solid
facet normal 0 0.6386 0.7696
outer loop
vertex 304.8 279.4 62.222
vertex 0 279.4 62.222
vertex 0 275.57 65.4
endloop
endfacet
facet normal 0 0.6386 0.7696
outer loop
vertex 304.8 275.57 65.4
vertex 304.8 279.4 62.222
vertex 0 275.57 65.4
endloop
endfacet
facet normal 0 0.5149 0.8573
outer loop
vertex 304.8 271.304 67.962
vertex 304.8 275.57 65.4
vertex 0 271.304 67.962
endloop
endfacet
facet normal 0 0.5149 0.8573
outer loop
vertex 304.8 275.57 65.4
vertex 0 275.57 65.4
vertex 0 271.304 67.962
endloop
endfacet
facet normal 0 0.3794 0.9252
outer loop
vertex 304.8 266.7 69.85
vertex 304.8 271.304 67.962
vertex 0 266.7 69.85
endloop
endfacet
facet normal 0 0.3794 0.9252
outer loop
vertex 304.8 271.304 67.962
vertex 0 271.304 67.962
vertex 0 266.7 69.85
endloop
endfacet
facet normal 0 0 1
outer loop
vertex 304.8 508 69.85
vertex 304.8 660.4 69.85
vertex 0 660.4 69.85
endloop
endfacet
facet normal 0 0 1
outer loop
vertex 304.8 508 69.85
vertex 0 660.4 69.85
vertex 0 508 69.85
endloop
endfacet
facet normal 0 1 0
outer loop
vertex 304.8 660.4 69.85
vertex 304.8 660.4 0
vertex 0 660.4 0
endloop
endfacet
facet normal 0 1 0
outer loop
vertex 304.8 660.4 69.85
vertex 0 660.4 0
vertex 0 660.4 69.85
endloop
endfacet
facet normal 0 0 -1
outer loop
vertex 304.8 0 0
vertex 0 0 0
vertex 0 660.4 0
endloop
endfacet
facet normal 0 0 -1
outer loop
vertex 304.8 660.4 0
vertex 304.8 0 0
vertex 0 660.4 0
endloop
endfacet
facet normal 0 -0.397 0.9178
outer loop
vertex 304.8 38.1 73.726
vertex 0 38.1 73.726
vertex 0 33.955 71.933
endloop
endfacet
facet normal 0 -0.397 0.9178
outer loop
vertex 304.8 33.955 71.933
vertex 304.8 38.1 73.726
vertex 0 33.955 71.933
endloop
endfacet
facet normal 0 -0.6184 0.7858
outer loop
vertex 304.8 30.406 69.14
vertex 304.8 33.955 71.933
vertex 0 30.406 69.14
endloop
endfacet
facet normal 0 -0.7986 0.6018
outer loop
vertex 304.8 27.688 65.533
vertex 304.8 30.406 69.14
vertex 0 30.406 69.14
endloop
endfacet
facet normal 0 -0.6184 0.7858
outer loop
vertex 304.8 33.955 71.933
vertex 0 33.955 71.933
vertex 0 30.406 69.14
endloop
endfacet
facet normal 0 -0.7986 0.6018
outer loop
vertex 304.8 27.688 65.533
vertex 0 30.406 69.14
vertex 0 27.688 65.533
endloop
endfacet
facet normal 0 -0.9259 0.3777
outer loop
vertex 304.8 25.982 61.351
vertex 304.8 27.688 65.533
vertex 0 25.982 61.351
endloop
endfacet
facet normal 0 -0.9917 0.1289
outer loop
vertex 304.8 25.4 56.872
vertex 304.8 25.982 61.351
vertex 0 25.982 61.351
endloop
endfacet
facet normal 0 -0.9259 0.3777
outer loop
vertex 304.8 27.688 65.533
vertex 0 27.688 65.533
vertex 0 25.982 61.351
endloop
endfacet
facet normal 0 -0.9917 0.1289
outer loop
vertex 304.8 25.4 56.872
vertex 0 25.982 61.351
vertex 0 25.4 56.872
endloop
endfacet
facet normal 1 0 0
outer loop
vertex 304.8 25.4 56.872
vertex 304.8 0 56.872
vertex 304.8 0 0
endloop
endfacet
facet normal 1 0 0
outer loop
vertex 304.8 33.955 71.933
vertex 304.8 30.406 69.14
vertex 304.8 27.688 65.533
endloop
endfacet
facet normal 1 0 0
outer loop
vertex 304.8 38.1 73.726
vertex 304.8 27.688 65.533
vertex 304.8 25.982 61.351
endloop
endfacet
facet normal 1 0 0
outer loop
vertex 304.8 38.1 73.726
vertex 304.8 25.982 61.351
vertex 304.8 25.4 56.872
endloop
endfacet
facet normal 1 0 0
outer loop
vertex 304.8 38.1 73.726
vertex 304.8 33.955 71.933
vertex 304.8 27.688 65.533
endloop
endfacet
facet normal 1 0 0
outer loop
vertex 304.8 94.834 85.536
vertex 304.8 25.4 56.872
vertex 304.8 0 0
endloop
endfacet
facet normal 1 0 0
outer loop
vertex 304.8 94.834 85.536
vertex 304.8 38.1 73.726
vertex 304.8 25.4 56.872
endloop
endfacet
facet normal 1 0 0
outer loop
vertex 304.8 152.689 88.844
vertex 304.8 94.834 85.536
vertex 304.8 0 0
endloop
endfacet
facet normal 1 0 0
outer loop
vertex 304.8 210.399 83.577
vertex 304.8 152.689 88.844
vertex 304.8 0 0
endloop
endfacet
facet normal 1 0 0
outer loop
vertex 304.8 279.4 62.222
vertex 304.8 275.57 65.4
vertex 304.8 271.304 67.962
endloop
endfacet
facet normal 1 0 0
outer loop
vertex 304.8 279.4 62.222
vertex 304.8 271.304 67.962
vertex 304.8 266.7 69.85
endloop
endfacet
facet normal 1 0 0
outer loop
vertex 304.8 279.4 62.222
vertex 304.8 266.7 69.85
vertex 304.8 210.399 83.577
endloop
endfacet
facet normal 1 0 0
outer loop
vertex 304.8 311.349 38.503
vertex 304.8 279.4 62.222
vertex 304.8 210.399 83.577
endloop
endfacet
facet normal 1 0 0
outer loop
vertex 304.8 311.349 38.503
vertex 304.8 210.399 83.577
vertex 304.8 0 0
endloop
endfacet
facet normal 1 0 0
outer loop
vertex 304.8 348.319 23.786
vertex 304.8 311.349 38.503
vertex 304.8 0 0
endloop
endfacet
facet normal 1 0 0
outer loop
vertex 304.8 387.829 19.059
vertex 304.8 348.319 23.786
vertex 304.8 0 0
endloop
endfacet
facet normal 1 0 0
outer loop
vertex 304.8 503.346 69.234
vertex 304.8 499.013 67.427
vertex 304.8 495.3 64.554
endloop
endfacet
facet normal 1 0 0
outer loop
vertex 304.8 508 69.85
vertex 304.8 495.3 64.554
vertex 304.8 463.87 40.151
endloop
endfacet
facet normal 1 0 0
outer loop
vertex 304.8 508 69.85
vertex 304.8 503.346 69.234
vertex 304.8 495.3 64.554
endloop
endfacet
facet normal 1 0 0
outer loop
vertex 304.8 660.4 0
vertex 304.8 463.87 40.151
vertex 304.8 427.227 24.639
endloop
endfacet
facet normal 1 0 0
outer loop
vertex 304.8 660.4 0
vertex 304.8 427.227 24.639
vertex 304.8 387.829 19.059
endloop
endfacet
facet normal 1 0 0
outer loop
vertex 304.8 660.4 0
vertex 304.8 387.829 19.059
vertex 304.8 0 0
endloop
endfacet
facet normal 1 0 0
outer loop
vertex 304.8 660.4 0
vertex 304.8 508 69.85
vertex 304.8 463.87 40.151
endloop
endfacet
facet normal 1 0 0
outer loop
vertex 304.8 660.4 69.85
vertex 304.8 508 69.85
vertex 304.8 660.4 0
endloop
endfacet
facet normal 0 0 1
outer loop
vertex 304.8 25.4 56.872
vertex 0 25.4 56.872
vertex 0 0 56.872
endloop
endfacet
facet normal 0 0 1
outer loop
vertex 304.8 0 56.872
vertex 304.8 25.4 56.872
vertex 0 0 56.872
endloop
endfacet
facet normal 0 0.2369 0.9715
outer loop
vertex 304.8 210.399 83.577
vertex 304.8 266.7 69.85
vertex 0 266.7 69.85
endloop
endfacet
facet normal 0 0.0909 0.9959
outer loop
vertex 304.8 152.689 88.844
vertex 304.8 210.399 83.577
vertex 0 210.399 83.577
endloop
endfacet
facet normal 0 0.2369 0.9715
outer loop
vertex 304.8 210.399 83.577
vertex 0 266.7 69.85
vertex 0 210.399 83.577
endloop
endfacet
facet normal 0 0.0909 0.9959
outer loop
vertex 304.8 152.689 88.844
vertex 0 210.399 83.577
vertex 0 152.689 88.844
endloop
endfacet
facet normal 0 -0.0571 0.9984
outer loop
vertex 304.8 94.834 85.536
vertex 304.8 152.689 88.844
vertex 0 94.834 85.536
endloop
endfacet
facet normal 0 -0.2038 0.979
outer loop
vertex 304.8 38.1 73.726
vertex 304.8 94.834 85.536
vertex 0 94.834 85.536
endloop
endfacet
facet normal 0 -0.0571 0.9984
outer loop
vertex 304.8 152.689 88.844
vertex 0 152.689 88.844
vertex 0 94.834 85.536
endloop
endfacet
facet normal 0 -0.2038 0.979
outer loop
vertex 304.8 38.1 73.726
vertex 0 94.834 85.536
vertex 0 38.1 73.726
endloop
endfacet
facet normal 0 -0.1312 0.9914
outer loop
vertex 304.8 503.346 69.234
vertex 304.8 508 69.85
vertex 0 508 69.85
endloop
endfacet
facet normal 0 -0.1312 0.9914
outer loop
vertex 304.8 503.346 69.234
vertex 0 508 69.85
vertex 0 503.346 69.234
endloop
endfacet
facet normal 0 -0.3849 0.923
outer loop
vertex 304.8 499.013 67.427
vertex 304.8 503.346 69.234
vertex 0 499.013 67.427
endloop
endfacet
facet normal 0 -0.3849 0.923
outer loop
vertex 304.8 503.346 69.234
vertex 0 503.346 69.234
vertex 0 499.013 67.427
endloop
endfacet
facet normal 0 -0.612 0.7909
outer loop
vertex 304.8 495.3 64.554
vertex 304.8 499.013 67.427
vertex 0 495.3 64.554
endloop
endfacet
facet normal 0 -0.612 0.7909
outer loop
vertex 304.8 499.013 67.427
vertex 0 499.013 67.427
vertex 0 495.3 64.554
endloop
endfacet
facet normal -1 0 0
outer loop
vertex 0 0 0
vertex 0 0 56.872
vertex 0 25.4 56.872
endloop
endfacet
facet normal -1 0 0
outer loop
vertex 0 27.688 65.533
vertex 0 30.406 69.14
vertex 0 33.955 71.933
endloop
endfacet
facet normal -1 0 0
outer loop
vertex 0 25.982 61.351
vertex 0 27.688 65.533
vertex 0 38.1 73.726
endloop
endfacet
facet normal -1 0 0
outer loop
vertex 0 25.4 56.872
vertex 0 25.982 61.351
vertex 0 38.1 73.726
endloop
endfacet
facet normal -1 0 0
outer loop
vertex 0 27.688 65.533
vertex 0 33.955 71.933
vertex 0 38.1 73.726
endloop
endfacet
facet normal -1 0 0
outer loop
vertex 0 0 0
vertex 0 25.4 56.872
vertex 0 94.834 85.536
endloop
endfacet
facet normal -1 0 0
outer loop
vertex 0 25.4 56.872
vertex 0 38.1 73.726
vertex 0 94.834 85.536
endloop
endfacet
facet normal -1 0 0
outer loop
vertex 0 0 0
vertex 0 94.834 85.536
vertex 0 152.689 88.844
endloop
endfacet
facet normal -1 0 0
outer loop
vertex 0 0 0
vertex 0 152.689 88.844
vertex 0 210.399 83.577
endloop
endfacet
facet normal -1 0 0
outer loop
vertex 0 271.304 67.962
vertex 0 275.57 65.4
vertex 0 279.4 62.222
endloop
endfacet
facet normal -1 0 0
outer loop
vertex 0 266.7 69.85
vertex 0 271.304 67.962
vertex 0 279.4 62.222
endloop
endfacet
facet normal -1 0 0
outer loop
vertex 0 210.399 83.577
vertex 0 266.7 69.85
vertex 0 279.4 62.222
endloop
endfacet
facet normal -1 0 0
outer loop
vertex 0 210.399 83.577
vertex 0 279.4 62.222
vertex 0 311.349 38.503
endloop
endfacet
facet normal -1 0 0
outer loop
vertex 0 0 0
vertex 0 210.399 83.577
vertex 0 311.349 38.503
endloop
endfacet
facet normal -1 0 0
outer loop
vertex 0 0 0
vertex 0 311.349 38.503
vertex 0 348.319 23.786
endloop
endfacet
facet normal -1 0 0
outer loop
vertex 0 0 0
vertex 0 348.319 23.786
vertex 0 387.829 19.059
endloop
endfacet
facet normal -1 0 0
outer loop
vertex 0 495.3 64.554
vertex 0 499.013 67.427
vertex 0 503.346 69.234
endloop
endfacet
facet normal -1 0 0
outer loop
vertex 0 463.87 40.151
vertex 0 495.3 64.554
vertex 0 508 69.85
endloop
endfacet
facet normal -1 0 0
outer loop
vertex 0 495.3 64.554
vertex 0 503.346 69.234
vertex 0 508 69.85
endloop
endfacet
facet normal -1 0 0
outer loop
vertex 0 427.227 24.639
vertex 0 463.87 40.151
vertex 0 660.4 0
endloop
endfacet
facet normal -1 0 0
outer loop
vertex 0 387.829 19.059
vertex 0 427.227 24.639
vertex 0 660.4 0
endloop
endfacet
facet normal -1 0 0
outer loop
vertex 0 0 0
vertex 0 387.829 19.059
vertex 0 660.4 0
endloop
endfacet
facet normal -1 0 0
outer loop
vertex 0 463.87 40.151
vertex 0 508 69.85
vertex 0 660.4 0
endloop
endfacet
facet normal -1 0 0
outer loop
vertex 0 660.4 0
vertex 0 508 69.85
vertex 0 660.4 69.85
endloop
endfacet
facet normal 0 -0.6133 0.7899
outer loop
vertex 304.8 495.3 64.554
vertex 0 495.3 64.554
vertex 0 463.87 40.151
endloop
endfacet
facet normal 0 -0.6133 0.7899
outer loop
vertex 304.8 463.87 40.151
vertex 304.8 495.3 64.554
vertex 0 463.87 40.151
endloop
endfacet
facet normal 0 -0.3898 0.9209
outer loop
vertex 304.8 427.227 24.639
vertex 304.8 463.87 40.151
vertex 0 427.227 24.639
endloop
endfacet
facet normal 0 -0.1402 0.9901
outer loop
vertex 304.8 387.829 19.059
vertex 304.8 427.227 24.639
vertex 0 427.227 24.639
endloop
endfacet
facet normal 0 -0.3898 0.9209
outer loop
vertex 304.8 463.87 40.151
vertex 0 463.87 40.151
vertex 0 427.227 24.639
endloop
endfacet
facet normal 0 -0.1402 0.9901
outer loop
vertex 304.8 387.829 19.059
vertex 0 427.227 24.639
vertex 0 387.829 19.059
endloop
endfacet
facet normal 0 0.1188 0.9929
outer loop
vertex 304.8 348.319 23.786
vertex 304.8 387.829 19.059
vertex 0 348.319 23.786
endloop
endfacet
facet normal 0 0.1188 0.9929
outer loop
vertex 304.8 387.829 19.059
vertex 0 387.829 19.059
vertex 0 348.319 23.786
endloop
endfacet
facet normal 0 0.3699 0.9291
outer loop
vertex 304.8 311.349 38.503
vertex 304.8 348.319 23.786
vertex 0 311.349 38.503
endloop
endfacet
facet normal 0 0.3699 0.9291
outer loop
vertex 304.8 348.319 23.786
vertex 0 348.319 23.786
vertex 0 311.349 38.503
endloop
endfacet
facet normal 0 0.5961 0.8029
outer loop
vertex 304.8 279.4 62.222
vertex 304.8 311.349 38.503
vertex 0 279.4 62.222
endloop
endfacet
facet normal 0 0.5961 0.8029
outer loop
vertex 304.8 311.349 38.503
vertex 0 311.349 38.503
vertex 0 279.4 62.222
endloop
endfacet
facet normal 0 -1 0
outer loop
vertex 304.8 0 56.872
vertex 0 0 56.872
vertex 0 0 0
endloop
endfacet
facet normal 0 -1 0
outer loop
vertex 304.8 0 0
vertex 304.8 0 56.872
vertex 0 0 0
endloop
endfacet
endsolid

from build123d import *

# Parameters (mm, degrees)
F1_DEPTH = 304.8


with BuildPart() as f1:
    # F0 (on Right) → F1 (new body)
    with BuildSketch(Plane.YZ):
        with BuildLine():
            Line((0, 0), (25.4, 0))
            Line((25.4, 0), (635, 0))
            Line((635, 0), (660.4, 0))
            Line((660.4, 0), (660.4, 69.85))
            Line((660.4, 69.85), (635, 69.85))
            Line((635, 69.85), (508, 69.85))
            ThreePointArc((508, 69.85), (501.120084, 68.473081), (495.3, 64.554436))
            ThreePointArc((495.3, 64.554436), (387.828804, 19.05896), (279.4, 62.222496))
            ThreePointArc((279.4, 62.222496), (273.485985, 66.762175), (266.7, 69.85))
            ThreePointArc((266.7, 69.85), (152.689214, 88.843713), (38.1, 73.726423))
            ThreePointArc((38.1, 73.726423), (28.93043, 67.423949), (25.4, 56.872255))
            Line((25.4, 56.872255), (0, 56.872255))
            Line((0, 56.872255), (0, 0))
        make_face()
    extrude(amount=F1_DEPTH)


solid = f1.part
